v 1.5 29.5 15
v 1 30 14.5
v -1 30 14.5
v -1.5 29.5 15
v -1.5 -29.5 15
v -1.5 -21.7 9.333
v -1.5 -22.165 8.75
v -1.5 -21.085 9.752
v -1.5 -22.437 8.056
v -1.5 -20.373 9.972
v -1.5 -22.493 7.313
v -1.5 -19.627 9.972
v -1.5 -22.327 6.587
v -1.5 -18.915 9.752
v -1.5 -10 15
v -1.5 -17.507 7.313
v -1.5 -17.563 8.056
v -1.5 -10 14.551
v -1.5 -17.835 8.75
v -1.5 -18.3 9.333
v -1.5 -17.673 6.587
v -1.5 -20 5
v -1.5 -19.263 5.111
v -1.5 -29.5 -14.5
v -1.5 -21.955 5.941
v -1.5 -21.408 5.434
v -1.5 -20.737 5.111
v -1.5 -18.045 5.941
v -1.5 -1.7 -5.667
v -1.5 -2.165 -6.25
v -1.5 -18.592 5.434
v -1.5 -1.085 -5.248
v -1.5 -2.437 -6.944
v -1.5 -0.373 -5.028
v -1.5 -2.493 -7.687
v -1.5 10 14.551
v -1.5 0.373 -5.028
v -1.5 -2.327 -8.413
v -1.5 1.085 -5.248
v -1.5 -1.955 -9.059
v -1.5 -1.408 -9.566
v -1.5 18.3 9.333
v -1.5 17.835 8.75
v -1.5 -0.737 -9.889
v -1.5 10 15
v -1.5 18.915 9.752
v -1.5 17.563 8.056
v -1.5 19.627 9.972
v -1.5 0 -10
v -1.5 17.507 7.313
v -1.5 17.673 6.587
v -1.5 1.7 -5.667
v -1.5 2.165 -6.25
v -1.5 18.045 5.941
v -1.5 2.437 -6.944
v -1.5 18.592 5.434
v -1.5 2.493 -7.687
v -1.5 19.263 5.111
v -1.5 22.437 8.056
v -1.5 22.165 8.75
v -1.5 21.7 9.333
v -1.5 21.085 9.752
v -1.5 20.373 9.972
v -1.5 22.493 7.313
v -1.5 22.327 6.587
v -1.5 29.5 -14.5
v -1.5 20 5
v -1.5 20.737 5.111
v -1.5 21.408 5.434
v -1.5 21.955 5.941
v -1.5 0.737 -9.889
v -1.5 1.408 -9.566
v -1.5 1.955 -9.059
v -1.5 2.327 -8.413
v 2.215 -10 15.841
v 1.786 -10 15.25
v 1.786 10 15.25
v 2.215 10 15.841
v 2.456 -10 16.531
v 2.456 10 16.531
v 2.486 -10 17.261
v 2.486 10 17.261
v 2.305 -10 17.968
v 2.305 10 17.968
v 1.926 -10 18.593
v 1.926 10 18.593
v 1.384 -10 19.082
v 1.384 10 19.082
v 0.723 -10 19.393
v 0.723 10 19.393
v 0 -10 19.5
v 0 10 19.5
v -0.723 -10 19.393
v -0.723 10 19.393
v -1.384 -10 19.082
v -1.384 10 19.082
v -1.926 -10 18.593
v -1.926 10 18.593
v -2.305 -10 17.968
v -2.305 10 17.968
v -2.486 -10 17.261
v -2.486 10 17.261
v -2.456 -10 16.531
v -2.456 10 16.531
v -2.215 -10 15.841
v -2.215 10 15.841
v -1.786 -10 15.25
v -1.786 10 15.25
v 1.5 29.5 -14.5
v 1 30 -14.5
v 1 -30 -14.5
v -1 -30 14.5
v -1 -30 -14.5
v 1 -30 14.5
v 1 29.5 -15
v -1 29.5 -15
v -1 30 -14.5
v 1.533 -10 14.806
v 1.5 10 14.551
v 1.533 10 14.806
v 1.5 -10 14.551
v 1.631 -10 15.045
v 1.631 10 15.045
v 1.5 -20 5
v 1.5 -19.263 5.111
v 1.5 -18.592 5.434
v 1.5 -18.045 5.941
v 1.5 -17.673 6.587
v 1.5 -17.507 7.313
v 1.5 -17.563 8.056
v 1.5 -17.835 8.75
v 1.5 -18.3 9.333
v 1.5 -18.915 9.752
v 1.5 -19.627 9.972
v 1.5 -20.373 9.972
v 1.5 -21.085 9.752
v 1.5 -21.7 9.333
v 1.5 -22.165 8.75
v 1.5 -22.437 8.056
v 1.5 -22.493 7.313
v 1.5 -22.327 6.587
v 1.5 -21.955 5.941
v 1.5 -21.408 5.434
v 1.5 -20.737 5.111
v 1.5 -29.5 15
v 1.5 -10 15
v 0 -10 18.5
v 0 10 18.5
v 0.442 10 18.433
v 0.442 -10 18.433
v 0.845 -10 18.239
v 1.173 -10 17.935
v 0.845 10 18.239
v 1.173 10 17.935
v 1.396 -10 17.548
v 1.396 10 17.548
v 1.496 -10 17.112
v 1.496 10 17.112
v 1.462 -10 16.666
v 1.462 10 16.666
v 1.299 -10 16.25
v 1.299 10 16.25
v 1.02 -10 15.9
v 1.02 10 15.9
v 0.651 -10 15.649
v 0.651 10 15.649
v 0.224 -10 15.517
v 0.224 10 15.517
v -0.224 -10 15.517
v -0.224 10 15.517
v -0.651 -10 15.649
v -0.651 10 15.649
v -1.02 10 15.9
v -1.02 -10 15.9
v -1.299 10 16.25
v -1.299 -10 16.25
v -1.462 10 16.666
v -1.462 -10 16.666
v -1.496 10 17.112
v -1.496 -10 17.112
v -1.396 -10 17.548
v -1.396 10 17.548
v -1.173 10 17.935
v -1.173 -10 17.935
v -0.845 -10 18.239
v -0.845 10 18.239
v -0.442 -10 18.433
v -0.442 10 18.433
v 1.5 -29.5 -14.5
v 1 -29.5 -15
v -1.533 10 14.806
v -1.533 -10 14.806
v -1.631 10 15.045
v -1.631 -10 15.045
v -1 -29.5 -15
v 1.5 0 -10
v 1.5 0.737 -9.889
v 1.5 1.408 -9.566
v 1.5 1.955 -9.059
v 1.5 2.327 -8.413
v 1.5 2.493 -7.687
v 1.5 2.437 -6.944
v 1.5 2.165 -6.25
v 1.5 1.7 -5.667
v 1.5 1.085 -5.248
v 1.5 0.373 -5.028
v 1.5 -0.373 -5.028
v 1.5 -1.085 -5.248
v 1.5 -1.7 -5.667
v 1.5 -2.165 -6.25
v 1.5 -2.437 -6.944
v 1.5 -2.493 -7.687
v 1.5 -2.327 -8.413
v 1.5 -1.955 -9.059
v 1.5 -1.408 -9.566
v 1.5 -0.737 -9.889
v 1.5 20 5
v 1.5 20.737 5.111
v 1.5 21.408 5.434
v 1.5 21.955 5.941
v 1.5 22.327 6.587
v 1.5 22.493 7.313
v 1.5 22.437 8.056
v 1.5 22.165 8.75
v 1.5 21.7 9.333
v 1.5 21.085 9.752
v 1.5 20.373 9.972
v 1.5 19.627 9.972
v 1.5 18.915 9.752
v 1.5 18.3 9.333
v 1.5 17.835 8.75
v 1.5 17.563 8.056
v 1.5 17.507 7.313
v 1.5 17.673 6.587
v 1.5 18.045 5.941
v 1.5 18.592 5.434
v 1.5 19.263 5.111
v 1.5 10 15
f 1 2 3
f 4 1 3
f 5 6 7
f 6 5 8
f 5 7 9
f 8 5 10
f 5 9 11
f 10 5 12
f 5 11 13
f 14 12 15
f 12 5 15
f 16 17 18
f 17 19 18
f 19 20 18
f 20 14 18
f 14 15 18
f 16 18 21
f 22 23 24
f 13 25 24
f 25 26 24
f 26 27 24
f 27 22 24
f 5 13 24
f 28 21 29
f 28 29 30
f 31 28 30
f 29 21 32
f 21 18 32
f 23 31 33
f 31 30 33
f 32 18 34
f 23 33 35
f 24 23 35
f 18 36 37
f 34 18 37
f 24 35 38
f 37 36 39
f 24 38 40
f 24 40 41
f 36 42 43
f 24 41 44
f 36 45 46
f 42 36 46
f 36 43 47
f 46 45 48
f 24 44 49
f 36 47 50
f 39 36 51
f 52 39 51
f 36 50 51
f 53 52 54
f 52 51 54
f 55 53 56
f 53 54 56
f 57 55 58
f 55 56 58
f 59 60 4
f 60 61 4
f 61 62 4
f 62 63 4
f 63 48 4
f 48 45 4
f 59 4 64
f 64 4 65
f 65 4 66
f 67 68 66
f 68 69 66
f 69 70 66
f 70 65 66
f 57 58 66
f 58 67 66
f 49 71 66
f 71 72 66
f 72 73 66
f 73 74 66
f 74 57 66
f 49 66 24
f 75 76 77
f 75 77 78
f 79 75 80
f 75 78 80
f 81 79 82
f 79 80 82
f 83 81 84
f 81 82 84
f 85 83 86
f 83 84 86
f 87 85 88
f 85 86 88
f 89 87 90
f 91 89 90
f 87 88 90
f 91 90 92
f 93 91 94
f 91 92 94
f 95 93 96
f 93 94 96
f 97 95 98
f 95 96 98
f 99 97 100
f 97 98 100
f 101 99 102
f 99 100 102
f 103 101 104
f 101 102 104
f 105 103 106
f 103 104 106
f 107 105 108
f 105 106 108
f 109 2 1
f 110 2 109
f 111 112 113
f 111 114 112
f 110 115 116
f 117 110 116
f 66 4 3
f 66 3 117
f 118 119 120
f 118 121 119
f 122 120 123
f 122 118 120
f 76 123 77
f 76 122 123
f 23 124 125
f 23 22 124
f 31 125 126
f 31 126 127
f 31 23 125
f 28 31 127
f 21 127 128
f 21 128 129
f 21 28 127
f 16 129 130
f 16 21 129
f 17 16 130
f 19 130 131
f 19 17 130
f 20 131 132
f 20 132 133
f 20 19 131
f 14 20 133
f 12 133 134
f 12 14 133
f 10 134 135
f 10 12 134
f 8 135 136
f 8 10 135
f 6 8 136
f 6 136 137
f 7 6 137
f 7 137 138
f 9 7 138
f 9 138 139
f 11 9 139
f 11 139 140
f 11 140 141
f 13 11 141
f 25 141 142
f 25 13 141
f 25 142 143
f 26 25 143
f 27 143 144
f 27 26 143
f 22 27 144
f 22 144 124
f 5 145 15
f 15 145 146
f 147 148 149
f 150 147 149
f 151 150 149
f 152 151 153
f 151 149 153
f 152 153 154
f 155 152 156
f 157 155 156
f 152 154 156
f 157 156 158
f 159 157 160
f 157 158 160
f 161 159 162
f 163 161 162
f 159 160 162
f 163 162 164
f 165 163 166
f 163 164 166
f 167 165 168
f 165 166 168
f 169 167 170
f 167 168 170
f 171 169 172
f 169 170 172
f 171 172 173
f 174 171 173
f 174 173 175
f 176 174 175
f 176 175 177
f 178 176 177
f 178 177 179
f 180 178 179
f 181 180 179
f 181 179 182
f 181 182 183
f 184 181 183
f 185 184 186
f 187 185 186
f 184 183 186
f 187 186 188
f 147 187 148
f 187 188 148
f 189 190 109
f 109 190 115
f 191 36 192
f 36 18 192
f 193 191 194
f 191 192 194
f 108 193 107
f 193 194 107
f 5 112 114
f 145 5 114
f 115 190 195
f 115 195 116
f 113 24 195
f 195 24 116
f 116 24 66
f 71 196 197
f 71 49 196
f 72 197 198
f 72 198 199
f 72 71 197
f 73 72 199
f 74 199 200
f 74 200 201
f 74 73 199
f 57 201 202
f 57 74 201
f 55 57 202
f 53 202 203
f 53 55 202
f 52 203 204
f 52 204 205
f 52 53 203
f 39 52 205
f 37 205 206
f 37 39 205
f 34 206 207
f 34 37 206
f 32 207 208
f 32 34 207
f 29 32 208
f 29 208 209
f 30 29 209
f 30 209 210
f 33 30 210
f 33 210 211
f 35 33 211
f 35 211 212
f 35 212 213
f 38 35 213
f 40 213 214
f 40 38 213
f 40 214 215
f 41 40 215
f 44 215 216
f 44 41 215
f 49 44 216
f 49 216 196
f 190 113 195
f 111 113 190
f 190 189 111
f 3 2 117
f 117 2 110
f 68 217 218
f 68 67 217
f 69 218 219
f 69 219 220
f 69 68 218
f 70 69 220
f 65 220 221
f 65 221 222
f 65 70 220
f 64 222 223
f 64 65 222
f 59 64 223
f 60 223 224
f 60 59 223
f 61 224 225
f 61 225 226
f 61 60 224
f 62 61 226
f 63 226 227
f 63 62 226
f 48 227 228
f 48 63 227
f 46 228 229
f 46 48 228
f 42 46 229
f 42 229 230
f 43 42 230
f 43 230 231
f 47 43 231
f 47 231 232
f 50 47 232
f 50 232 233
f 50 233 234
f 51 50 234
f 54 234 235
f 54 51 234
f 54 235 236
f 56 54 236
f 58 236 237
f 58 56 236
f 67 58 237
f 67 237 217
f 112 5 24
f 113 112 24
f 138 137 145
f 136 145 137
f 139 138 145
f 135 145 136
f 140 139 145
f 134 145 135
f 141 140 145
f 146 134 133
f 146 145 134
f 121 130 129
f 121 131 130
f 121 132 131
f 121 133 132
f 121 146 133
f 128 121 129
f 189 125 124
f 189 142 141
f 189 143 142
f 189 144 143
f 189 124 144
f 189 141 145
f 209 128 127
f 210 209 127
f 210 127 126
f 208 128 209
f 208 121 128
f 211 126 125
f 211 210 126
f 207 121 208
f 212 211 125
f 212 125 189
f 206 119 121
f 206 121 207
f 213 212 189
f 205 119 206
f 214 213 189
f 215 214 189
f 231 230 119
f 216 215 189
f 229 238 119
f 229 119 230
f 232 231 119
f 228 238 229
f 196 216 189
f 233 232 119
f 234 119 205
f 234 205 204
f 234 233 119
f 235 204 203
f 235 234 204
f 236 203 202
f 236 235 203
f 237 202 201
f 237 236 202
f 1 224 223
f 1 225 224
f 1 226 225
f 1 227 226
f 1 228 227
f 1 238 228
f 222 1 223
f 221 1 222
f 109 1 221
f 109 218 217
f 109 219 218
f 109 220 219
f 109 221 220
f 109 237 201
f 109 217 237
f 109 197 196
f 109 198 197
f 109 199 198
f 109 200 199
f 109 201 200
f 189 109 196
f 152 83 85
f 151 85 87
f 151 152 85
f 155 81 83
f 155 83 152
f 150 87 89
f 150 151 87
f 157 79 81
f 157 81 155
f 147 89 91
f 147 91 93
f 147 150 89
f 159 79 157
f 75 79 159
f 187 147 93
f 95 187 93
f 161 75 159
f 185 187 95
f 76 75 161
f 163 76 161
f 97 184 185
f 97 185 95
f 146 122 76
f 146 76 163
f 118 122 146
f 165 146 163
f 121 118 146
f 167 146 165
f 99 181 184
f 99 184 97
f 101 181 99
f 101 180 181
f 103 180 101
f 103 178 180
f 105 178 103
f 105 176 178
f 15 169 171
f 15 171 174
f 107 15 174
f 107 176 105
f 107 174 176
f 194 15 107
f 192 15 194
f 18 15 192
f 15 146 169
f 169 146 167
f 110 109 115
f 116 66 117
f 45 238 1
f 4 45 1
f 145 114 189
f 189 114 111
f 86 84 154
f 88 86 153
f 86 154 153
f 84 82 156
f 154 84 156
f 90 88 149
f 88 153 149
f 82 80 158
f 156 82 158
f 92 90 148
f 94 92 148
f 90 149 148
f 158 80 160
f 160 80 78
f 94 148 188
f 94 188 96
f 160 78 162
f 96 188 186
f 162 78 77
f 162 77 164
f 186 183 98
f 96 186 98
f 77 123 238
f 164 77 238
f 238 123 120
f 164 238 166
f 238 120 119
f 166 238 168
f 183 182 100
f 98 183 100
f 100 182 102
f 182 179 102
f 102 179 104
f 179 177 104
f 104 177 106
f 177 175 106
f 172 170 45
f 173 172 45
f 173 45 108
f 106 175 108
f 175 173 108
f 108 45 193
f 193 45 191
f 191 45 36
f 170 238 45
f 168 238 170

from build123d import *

# Parameters (mm, degrees)
SKETCH1_W           = 30
SKETCH1_H           = 60
SKETCH1_R           = 2.5
BOSS_EXTRUDE1_DEPTH = 1.5
BOSS_EXTRUDE2_START = -20
SKETCH3_R           = 1.5
BOSS_EXTRUDE2_DEPTH = 20
FILLET2_R           = 1
CHAMFER2_SIZE       = 0.5


with BuildPart() as part:
    # Sketch1 → Boss-Extrude1 (new, symmetric)
    with BuildSketch(Plane(origin=(0, 0, 0), x_dir=(0, 0, -1), z_dir=(1, 0, 0))):
        Rectangle(SKETCH1_W, SKETCH1_H)
        with Locations((-7.5, 20)):
            Circle(SKETCH1_R, mode=Mode.SUBTRACT)
        with Locations((7.5, 0)):
            Circle(SKETCH1_R, mode=Mode.SUBTRACT)
        with Locations((-7.5, -20)):
            Circle(SKETCH1_R, mode=Mode.SUBTRACT)
    extrude(amount=BOSS_EXTRUDE1_DEPTH, both=True)

    # Sketch3 → Boss-Extrude2 (add)
    with BuildSketch(Plane(origin=(0, 30, 0), x_dir=(1, 0, 0), z_dir=(0, 1, 0)).offset(BOSS_EXTRUDE2_START)):
        with BuildLine():
            Line((-1.5, -15), (1.5, -15))
            ThreePointArc((1.5, -15), (0, -19.5), (-1.5, -15))
        make_face()
        with Locations(Location((0, -17, 0), (0, 0, 270))):
            Circle(SKETCH3_R, mode=Mode.SUBTRACT)
    extrude(amount=-BOSS_EXTRUDE2_DEPTH)

    # Fillet2
    fillet2_edges = [part.edges().sort_by_distance(p)[0] for p in [
        (1.5, 0, 15),
        (-1.5, 0, 15),
    ]]
    fillet(fillet2_edges, radius=FILLET2_R)

    # Chamfer2
    chamfer2_edges = [part.edges().sort_by_distance(p)[0] for p in [
        (1.5, 0, -15),
        (1.5, 30, 0),
        (-1.5, 30, 0),
        (-1.5, 0, -15),
        (-1.5, -30, 0),
        (1.5, -30, 0),
        (0, 30, 15),
        (0, 30, -15),
        (0, -30, -15),
        (0, -30, 15),
    ]]
    chamfer(chamfer2_edges, length=CHAMFER2_SIZE)


solid = part.part
